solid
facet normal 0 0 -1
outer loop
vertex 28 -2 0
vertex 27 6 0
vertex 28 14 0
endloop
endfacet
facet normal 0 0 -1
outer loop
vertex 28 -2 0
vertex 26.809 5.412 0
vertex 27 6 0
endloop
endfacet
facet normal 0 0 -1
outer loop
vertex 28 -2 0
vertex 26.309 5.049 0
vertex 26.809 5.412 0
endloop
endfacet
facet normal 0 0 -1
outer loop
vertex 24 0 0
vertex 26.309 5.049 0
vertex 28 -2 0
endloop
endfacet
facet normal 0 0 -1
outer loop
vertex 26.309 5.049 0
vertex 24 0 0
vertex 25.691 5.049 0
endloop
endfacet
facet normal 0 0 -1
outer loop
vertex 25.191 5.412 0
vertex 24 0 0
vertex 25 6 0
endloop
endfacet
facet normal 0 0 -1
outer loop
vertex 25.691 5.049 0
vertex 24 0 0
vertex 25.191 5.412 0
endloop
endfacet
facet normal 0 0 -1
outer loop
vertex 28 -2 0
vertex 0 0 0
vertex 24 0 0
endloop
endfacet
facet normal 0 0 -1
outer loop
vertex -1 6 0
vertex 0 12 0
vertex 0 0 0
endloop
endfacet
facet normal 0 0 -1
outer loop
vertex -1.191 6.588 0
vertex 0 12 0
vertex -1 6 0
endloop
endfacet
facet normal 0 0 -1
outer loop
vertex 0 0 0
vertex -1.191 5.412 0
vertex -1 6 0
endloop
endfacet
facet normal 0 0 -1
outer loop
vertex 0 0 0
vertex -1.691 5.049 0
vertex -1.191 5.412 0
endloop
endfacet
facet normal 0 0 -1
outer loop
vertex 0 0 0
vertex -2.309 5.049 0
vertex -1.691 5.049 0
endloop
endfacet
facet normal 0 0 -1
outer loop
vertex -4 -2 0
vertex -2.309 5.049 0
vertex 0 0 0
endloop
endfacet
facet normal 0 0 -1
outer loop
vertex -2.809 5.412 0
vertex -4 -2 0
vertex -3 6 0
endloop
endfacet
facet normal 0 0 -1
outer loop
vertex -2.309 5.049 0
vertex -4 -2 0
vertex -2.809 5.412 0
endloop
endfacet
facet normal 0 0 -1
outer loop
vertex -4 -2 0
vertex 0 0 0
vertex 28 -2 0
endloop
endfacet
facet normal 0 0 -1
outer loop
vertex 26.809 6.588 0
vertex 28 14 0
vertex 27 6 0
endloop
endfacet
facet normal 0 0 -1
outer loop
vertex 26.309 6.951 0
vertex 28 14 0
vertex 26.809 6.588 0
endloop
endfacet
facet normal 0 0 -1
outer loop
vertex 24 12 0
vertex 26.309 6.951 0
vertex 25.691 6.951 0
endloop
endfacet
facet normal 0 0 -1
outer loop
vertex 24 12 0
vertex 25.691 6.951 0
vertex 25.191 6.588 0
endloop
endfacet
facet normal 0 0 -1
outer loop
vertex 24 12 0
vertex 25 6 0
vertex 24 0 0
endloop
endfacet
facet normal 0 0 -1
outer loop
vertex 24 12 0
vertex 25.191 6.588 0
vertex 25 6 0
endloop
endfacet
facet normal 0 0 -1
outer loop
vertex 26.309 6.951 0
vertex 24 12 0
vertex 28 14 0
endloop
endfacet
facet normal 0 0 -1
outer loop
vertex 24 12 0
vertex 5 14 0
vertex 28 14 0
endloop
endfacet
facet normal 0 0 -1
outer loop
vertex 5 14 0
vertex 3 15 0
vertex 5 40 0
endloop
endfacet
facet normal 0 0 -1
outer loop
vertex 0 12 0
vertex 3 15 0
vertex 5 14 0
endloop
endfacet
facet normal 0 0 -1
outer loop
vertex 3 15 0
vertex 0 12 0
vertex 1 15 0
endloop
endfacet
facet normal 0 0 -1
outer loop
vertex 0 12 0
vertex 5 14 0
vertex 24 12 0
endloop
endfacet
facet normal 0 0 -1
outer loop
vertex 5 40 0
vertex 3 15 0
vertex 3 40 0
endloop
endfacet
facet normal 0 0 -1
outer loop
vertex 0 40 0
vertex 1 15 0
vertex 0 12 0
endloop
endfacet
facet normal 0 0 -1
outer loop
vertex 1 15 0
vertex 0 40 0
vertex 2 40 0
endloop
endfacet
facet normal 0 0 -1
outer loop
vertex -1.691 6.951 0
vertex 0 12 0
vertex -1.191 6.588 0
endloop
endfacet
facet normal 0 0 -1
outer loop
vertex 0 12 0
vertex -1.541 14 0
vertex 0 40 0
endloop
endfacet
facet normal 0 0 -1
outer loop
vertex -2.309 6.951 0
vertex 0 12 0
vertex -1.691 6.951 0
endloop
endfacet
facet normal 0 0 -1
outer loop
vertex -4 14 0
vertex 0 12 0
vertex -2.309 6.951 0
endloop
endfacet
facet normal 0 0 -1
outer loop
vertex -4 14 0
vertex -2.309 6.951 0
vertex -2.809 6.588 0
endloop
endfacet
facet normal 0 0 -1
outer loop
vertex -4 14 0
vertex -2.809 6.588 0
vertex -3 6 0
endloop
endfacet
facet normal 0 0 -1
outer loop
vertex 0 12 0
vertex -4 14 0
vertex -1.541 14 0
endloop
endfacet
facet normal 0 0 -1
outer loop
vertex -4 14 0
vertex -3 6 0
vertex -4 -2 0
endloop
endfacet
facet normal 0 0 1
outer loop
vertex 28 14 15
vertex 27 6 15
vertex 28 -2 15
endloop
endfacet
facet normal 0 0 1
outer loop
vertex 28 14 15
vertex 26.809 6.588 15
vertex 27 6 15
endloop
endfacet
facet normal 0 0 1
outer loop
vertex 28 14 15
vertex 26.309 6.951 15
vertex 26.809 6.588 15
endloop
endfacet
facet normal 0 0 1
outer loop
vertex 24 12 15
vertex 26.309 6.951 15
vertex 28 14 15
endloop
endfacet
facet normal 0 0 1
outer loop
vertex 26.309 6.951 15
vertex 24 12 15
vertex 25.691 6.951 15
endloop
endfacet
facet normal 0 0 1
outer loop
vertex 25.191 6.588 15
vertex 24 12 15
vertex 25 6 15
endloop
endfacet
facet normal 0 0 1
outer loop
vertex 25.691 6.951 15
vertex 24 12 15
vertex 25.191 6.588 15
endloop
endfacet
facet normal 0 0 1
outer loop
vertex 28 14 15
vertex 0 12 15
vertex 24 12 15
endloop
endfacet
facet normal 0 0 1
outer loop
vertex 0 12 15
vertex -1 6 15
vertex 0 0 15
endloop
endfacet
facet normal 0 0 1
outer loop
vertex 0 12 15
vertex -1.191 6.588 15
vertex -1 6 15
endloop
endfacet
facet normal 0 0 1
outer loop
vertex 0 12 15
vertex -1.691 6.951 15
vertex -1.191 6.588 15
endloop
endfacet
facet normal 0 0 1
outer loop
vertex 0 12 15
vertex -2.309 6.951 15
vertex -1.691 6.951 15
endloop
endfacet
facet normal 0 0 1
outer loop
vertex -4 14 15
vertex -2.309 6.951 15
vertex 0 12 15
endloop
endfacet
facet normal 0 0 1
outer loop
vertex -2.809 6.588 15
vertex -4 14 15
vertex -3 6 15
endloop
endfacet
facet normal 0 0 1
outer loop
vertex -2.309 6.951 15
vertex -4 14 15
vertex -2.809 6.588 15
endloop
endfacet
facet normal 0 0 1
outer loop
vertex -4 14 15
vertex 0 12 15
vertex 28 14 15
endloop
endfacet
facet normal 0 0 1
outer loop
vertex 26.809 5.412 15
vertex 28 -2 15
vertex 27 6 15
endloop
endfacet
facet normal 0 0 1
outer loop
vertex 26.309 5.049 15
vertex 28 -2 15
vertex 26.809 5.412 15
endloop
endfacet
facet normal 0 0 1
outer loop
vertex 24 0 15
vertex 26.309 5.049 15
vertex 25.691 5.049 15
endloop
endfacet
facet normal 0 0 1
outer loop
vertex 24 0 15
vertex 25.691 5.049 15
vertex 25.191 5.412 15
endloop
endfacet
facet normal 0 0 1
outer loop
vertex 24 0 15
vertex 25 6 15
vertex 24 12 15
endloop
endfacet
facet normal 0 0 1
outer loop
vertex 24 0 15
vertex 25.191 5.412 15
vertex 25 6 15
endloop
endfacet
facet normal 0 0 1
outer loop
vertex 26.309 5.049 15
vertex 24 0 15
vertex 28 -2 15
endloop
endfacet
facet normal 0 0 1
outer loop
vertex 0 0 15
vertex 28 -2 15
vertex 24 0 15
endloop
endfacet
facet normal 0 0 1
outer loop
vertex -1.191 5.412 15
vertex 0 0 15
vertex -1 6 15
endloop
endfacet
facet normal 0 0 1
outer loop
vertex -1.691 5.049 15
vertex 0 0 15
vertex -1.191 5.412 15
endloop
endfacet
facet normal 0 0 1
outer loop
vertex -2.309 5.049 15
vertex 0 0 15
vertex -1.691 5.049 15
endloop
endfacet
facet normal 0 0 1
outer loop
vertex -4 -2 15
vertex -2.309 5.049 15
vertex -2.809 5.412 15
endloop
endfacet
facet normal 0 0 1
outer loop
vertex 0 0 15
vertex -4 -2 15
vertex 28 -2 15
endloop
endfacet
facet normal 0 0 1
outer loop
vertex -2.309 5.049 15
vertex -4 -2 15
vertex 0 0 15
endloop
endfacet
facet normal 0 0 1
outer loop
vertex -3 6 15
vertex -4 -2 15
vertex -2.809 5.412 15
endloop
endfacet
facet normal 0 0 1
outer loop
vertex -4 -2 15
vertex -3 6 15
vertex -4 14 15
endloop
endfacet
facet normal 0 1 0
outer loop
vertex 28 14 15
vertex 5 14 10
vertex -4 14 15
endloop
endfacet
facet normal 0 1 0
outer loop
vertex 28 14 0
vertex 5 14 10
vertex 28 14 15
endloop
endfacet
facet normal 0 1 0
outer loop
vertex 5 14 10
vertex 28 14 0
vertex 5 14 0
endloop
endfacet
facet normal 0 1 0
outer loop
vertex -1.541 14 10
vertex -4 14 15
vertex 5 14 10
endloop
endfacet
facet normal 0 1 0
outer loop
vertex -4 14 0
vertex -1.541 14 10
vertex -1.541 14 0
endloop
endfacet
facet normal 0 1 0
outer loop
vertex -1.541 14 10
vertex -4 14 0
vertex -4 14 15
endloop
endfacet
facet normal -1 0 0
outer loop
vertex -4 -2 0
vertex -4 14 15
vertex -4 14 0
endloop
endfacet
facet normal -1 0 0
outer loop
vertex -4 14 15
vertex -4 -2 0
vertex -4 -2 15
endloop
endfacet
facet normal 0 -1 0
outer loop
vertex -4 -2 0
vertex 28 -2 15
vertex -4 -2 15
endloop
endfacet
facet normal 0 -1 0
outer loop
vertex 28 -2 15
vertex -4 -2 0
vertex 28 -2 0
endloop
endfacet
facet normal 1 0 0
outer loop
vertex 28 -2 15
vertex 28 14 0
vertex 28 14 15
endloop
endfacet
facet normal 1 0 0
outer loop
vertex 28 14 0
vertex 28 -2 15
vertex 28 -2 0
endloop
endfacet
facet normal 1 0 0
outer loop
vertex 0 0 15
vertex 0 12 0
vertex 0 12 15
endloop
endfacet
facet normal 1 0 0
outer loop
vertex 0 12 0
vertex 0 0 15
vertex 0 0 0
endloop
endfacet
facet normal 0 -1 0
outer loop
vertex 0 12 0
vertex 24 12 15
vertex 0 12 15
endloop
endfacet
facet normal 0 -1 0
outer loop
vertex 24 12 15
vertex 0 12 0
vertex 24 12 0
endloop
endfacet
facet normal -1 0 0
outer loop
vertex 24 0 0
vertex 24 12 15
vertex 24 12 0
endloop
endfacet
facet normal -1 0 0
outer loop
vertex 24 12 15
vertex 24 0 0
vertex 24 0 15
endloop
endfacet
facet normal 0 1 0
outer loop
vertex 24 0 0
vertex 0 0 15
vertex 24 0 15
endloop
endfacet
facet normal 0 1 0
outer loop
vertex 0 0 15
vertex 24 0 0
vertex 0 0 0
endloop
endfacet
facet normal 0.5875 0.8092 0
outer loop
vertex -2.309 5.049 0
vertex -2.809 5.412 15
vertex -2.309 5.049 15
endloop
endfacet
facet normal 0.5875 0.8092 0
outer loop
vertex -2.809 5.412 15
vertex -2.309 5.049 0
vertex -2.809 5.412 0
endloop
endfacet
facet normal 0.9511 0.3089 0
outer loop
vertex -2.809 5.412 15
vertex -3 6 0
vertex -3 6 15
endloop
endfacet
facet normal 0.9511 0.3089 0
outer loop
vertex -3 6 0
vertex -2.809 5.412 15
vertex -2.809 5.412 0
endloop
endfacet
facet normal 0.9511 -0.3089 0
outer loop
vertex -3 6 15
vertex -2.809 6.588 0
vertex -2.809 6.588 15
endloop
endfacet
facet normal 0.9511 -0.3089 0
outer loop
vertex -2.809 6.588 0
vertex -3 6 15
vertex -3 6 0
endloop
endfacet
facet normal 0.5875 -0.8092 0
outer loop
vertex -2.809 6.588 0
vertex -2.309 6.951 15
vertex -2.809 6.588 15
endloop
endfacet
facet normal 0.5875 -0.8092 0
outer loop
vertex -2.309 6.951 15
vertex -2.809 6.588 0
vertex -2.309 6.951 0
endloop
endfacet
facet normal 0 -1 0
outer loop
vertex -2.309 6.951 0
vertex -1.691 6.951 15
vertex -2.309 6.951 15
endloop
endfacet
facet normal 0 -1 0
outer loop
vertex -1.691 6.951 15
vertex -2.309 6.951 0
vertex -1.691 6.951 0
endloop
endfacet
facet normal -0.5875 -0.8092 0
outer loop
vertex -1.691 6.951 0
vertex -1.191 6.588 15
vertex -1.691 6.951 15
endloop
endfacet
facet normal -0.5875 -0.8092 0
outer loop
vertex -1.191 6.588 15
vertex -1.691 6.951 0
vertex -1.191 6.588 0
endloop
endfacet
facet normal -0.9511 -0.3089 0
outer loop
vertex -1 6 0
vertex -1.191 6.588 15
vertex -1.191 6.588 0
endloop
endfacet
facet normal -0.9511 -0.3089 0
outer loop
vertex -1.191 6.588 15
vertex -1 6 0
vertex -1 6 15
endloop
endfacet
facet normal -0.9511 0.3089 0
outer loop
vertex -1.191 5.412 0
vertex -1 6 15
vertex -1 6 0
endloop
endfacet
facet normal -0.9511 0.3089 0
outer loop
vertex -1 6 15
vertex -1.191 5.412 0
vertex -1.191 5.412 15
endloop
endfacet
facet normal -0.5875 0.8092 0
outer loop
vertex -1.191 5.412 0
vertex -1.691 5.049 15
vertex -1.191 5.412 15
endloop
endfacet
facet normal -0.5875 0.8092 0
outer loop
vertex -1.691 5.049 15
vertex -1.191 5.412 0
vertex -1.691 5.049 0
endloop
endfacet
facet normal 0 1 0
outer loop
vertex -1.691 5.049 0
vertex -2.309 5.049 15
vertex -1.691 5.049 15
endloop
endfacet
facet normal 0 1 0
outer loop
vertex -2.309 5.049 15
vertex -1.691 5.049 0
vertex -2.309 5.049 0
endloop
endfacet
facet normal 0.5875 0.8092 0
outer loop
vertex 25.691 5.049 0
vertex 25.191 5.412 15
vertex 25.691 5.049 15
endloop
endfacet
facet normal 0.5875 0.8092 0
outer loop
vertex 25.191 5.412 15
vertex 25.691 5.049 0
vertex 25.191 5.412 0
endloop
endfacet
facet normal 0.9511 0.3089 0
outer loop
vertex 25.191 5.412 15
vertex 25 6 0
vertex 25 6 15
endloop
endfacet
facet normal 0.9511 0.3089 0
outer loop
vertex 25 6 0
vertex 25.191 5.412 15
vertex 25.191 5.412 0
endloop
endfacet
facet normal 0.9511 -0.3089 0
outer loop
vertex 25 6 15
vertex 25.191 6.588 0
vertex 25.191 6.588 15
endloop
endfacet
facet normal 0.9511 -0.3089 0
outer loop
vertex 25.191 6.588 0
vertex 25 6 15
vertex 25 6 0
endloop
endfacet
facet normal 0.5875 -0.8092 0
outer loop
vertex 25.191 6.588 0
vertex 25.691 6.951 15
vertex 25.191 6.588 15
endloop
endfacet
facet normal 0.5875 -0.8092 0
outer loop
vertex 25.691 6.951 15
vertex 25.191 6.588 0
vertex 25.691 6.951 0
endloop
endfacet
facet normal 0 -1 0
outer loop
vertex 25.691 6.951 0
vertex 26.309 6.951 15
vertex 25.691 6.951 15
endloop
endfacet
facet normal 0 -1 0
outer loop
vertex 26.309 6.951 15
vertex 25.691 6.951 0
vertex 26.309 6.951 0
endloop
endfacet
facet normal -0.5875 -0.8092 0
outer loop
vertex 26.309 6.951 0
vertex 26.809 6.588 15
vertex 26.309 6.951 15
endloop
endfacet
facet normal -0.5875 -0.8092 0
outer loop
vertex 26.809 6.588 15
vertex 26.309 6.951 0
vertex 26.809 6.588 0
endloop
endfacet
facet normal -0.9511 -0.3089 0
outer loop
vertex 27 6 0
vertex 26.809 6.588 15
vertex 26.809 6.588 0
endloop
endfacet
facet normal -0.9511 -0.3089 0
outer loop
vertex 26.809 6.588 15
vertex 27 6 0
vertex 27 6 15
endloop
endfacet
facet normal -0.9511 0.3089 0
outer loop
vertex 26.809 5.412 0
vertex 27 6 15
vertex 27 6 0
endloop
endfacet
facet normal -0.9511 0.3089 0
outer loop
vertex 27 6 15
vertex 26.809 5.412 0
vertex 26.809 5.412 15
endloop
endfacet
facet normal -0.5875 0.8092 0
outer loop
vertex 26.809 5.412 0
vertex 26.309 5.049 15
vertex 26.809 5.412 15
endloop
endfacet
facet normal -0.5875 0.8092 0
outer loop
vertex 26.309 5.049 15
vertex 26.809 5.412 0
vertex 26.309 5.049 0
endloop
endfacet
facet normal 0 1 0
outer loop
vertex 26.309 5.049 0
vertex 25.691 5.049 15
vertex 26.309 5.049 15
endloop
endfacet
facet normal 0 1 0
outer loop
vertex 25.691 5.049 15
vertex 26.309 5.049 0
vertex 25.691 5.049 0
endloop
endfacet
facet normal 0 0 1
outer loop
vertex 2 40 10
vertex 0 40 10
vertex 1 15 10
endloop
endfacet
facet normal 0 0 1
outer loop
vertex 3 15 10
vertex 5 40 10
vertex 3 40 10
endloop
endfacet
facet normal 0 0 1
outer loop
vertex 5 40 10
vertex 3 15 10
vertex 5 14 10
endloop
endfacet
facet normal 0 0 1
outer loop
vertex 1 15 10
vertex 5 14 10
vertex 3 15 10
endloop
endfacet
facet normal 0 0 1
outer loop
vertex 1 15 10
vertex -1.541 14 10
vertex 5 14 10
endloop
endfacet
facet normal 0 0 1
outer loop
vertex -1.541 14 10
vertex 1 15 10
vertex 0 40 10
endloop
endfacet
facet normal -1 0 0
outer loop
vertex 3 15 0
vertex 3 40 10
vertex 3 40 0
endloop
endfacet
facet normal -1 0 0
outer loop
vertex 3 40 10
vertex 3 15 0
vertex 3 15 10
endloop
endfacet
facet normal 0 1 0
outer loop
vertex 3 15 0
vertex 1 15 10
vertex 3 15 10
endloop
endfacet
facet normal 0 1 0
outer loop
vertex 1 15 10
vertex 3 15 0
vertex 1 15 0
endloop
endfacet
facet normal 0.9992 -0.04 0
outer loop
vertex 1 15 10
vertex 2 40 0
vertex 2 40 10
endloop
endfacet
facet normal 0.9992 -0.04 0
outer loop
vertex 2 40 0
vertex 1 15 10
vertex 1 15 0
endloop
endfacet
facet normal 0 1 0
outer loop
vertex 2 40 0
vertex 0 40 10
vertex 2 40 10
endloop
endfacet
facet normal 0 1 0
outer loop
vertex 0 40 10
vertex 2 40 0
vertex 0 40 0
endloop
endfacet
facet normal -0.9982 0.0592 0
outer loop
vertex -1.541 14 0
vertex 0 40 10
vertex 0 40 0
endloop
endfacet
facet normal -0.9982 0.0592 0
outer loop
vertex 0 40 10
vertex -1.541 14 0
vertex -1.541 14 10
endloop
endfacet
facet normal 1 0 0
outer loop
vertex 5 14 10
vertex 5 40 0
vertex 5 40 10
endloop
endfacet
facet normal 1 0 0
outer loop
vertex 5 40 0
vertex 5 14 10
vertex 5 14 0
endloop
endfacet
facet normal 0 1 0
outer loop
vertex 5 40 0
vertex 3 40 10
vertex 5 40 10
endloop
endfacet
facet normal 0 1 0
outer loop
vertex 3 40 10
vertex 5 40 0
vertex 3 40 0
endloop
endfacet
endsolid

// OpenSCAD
//square([12,24]);



module case(){
    w=24;
    h=12;
    d=15;
    w_thickness=4;
    h_thickness=2;
    hole_edge=2;
    linear_extrude(d)
    difference() {
        polygon(points=[
            [0,0],
            [w,0],
            [w,h],
            [0,h],
            [-w_thickness,-h_thickness],
            [w+w_thickness,-h_thickness],
            [w+w_thickness,h+h_thickness],
            [-w_thickness,h+h_thickness],
        ],paths=[[0,1,2,3],[4,5,6,7]]);
        translate([hole_edge-w_thickness,h/2]) circle(1, $fn=10);
        translate([w-hole_edge+w_thickness,h/2]) circle(1, $fn=10);
    }
}

module tooth(length, width, height, head_height) {
    linear_extrude(height = head_height) {
        polygon([[-length / 2, 0], [-width / 2, height], [width / 2, height], [length / 2,0]]);
    }
}

module clip(){
   d=10;   
   l=25;
   gap_top = 3;
   gap_bottom = 4;
   thickness=2;
   direction = [1,0];
   normal = [direction[1],-direction[0]];
   list=[
        [-thickness,gap_bottom+1.3*thickness],

        [l,gap_top+thickness],[l,gap_top],[0,gap_bottom],[0,gap_bottom],

        [0,thickness],[l,thickness],[l,0],[0,0],
        [-thickness,0]
    ];   
   
   linear_extrude(d)
   polygon(points=list);
   
}


case();
translate([5,15,0]) rotate(90,0,0) clip();
